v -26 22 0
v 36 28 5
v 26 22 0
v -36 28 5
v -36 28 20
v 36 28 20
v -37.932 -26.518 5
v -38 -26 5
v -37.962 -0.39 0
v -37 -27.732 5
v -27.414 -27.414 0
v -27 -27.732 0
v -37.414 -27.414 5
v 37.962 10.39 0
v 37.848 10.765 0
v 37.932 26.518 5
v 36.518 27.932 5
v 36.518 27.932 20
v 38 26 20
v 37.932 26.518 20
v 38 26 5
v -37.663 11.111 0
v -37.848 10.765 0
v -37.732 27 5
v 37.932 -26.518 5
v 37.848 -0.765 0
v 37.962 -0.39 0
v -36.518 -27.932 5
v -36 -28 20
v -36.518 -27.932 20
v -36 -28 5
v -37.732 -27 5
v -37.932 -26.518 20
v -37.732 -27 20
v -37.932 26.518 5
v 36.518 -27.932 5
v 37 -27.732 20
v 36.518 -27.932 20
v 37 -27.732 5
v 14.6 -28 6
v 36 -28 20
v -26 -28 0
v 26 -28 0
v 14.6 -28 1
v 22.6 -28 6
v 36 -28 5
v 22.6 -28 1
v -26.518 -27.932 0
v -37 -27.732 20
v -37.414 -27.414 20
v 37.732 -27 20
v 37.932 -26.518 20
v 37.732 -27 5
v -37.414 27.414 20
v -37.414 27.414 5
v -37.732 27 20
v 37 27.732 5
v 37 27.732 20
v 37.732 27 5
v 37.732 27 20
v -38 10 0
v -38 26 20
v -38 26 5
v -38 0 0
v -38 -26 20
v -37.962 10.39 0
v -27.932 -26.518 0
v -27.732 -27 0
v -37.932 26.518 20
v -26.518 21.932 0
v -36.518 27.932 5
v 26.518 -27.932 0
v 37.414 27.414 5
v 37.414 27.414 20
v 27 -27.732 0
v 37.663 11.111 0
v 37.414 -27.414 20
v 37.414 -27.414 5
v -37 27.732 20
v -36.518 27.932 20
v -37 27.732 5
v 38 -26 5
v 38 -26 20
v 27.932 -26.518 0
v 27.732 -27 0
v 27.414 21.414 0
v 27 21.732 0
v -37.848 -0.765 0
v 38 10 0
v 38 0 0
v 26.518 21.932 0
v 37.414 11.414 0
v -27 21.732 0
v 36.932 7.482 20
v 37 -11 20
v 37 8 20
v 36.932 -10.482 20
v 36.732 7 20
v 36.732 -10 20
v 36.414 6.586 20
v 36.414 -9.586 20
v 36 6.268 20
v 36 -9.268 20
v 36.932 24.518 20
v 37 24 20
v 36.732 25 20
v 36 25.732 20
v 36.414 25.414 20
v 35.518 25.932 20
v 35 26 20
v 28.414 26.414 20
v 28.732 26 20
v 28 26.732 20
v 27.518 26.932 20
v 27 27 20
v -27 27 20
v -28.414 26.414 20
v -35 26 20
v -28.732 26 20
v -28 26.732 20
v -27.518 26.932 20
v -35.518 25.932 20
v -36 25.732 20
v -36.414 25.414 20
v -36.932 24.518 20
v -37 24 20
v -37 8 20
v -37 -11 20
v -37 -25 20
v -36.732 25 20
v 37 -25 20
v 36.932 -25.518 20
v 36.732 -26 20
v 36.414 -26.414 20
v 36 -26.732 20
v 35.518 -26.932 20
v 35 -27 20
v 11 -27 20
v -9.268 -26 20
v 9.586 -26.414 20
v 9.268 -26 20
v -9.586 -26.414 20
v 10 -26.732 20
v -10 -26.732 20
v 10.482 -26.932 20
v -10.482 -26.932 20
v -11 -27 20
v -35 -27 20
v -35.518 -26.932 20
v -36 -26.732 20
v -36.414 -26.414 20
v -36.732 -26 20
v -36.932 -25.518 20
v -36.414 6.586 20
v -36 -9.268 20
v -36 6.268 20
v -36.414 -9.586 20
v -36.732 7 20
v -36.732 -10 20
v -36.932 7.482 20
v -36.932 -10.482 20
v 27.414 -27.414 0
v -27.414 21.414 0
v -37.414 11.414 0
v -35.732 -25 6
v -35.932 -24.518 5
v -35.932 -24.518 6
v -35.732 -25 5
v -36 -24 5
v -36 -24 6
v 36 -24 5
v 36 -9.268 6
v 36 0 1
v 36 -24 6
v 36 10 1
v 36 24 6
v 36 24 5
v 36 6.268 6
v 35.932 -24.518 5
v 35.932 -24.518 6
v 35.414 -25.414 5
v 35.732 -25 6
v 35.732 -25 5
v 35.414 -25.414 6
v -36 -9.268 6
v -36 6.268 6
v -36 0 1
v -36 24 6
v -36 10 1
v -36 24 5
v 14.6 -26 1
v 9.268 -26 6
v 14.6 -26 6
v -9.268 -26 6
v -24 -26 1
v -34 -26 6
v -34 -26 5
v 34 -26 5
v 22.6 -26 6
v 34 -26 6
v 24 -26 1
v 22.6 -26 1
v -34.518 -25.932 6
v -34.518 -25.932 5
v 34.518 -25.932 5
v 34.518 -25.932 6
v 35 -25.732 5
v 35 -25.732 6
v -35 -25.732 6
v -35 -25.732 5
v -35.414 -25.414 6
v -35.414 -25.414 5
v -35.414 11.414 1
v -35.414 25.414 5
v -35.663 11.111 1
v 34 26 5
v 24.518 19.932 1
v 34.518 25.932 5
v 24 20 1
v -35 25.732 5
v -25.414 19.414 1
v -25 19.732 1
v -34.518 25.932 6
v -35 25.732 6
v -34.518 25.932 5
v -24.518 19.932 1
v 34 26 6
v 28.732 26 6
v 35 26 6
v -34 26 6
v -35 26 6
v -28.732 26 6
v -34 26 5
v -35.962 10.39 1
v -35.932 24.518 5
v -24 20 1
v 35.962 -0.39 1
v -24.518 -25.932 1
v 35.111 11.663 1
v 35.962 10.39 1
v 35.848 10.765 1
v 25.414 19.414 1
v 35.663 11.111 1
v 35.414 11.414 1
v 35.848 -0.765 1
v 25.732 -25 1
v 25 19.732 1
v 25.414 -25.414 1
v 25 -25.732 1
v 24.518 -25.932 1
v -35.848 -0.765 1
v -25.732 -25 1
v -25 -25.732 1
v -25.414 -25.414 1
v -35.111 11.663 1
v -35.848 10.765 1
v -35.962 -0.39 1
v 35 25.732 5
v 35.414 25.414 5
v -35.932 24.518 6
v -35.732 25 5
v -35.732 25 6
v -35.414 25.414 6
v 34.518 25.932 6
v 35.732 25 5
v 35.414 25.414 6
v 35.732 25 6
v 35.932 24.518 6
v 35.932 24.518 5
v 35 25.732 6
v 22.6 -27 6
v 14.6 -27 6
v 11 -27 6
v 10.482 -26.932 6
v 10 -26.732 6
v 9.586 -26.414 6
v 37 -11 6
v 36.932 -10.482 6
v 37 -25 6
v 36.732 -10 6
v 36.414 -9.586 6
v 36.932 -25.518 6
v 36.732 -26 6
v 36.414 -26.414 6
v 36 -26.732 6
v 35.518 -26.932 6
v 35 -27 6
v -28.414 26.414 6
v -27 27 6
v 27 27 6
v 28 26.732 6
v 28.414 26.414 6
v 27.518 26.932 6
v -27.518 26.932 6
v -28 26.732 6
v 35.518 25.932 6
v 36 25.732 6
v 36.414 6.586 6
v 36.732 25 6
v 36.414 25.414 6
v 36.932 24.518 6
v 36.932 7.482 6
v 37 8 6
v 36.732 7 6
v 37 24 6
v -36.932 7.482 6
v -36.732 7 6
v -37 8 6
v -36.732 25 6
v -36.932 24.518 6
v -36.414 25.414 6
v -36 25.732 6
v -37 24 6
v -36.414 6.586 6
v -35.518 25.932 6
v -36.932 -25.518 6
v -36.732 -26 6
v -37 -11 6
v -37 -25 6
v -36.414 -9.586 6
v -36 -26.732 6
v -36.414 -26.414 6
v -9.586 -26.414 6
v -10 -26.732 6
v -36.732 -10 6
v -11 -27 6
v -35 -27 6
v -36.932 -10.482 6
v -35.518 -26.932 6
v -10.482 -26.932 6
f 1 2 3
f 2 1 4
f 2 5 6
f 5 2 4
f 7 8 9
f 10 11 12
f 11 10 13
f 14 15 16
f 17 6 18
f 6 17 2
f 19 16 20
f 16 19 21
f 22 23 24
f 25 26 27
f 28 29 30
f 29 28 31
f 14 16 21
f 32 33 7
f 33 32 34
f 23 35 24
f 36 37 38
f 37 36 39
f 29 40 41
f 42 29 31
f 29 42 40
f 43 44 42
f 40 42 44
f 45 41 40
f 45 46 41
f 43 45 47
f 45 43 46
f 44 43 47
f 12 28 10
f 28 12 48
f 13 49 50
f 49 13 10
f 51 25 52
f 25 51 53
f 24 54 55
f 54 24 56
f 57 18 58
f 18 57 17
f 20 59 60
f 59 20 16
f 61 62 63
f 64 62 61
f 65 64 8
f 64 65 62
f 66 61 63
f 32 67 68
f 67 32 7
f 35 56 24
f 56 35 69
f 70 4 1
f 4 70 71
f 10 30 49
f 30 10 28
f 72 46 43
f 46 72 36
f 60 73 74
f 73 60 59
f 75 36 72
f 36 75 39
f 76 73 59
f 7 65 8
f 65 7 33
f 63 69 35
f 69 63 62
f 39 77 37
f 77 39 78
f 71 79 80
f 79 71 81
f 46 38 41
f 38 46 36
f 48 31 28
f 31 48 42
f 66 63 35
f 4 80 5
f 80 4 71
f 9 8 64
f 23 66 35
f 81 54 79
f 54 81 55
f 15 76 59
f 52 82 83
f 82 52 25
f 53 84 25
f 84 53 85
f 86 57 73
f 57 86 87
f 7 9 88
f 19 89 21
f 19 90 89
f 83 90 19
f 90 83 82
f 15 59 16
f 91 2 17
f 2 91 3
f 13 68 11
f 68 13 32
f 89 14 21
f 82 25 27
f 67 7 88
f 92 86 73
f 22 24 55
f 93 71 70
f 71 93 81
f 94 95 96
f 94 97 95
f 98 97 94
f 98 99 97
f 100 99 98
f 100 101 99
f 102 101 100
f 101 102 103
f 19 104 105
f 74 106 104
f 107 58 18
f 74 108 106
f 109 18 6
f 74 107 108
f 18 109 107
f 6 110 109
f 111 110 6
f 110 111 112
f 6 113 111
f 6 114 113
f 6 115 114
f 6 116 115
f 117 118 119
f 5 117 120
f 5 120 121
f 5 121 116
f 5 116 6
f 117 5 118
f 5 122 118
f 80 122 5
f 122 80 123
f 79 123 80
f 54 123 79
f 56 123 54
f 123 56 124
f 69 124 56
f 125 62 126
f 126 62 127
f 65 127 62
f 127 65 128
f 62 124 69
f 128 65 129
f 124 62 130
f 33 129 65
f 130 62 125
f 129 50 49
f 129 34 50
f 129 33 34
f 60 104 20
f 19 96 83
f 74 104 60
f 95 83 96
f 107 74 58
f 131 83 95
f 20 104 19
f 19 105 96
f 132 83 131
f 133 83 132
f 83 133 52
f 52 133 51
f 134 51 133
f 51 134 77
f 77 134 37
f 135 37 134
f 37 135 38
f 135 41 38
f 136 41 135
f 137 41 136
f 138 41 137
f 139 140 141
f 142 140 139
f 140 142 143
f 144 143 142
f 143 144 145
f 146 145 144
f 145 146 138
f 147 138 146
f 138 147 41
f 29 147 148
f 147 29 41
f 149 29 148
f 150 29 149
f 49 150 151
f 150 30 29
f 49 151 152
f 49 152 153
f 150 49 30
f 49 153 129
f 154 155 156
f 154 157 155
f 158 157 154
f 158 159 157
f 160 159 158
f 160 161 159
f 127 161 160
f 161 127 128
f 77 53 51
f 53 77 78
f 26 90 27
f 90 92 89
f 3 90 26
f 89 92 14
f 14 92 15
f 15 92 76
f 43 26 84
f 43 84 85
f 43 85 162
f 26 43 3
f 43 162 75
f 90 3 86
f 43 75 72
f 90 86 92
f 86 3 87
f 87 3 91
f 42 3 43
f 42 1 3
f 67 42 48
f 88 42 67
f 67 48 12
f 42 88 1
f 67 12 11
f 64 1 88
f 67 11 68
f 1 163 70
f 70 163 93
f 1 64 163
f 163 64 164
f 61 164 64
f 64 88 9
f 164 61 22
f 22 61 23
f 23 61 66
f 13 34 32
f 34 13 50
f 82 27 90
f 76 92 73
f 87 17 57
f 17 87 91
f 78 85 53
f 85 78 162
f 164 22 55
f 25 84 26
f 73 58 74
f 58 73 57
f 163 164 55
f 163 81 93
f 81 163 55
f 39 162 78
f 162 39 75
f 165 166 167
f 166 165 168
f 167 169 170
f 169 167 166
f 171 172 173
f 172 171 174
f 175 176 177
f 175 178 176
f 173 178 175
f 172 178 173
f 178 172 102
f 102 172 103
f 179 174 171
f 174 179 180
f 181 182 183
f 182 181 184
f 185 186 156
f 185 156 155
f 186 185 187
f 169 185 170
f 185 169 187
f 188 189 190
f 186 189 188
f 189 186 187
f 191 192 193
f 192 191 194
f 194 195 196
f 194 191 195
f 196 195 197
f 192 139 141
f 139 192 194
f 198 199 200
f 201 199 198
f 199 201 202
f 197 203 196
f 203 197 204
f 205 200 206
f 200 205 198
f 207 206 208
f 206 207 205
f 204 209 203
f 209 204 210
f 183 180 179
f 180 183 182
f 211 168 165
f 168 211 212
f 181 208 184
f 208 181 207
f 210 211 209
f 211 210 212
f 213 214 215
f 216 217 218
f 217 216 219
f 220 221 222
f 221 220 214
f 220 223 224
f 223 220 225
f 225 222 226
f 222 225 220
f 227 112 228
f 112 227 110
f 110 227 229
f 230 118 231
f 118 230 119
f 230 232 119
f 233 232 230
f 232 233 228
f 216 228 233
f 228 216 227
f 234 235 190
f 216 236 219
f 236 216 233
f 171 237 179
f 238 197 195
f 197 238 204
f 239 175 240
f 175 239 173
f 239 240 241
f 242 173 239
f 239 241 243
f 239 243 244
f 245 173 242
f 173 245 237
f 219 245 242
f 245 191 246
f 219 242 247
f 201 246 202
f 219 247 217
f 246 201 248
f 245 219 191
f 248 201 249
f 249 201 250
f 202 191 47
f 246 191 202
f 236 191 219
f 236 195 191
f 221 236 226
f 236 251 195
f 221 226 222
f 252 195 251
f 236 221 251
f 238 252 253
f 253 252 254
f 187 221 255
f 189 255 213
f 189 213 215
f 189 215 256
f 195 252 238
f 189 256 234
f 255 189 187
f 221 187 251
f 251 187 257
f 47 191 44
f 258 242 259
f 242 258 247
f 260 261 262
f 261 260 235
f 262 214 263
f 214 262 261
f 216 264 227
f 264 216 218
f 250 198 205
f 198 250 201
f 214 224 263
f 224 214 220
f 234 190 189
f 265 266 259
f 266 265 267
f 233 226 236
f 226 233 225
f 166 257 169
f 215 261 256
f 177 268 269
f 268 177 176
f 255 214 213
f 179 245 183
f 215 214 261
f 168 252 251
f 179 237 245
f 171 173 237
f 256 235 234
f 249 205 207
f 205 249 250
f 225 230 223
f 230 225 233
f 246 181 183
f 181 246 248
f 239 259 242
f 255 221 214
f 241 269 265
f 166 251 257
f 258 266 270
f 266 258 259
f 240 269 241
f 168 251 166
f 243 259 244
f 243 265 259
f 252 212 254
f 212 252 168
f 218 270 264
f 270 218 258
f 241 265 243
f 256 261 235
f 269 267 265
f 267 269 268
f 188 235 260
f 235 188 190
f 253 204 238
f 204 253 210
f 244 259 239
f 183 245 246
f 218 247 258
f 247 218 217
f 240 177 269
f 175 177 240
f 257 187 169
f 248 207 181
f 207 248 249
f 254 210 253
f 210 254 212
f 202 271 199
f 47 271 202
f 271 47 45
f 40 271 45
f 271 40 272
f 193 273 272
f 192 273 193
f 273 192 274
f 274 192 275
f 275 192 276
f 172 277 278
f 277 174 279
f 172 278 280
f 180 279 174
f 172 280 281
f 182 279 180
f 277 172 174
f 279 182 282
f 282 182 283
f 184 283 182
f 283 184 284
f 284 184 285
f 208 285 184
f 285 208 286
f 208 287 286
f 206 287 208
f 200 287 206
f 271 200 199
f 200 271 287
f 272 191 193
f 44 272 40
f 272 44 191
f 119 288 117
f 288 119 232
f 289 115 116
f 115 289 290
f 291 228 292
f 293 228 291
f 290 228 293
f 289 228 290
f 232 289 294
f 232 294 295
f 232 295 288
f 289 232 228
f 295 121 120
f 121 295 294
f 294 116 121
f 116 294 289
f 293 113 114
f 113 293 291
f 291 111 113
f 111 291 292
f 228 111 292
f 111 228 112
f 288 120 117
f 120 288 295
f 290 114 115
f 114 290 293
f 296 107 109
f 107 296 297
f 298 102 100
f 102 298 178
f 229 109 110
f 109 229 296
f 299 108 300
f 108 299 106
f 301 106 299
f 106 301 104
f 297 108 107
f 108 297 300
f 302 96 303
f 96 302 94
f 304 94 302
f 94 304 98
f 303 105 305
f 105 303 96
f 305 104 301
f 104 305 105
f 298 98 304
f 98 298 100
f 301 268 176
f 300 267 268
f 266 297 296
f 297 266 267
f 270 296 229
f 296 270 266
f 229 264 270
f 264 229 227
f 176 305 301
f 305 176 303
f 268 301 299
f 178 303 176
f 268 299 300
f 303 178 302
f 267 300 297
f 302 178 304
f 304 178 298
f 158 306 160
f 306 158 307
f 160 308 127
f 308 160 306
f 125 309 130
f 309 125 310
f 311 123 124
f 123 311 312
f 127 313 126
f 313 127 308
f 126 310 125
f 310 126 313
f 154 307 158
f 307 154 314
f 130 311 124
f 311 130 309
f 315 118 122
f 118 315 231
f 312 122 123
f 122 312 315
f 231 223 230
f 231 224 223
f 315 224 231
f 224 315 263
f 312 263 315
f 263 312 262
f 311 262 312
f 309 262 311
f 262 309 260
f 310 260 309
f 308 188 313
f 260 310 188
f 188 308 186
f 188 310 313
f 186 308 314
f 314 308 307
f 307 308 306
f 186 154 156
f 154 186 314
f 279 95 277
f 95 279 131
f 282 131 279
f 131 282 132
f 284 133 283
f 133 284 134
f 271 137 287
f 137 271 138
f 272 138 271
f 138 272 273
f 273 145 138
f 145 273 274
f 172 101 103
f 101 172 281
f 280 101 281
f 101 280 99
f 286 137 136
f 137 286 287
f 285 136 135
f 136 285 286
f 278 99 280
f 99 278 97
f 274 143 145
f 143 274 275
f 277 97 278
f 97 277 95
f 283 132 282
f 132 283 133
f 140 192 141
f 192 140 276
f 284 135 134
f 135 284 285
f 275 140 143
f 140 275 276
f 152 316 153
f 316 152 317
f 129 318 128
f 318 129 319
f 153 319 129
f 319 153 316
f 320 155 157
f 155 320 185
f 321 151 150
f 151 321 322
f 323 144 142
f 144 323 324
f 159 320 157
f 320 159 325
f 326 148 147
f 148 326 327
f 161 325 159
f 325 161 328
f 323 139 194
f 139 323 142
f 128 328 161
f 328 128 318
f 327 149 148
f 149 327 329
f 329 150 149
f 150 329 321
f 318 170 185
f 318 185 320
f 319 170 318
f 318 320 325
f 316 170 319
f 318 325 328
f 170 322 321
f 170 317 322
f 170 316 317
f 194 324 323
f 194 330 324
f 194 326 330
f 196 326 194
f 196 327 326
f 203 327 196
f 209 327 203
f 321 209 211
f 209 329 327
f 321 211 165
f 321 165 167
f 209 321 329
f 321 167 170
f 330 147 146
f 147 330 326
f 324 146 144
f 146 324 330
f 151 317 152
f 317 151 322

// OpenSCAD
// file: config.scad
$fn = 24;

//Parameters for servo_lx16a
//x,y,z => w,l,h


//servo dimensions
servo_l         = 45.20; //
servo_w         = 24.70; //
servo_h         = 35; //

body_h          = 32; //


top_hub_shoulder_d = 10.5;  
bottom_hub_shoulder_d = 10;

hub_offset      = 10.10; //

rad = 2;


w_between_holes = 20.5; //
att_hole_dia = 1.6; //
attach_screw_l = 5;

//horn side dimensions (top side)
l_between_top_holes = 20.7; //
top_hole_l_offset = 6.1; //
top_hub_carve_h = 2.6; // shown on the side view
top_attach_carve_h = 1.1; //shown on the side view
top_horn_h = 3.20; //
top_horn_d = 6.3; //
horn_hole_d = 2.5; //
top_wider_ridge_l = 14.2; //
top_wider_ridge_w = 19.4; //
top_wider_ridge_offset = 9.3625; //
top_narrow_ridge_w = 13.85;

//pivot side dimensions (bottom side)
l_between_bottom_holes = 24.45; //
bottom_hole_l_offset = 2.35; //
bottom_hub_carve_h = 3.4; // shown on the side view
bottom_attach_carve_h = 1.9; // shown on the side view
bottom_horn_h = 4.1; //
bottom_horn_d = 6; //
bottom_wider_ridge_l = 13.25; //
bottom_wider_ridge_w = 18.48; //
bottom_wider_ridge_offset = 5.61; //
bottom_narrow_ridge_w = 13.5; //

hub_carve_l = 15.57;

hub_carve_r = 10.8;

hub_r = 10.1;

connectors_w = 19;
connectors_l = 4.6;
connectors_h = 4;
connectors_depth = 9;


horn_d = 19.56;
horn_screws_distance = 14.00;



 
// main file
include <config.scad>
//use <servo_12g.scad>
//use <servo_5g.scad>
//use <electronics.scad>


chest();


module chest(){
    
    union(){
    
        difference(){
            
            union(){
                
                hull(){
                
                    translate([-76/2, -56/2, 19])
                    roundedRect([76-rad, 56-rad, 1], rad);
                    
                    translate([-76/2, -56/2, 5])
                    roundedRect([76-rad, 56-rad, 1], rad);
                        
                    translate([-56/2, -50/2-3, 0])
                    roundedRect([56-rad, 50-rad, 1], rad);
                    
                    translate([-72/2, 0, 0])
                    cylinder(r=rad, h=20, $fn=32);
                    
                    translate([72/2, 0, 0])
                    cylinder(r=rad, h=20, $fn=32);

                    translate([-72/2, 10, 0])
                    cylinder(r=rad, h=20, $fn=32);
                    
                    translate([72/2, 10, 0])
                    cylinder(r=rad, h=20, $fn=32);
                    
                    //translate([-74/2, -10, 5])
                    //cylinder(r=rad, h=15, $fn=32);
                    
                    //translate([74/2, -10, 5])
                    //cylinder(r=rad, h=15, $fn=32);

                    
                }
            
                
               /**
                //right side tab
                translate([-76/2, 0, 10+20/2]) rotate([0, 0, 0]) difference() {
                    union() {
                        
                        translate([-2/2, -12.5/2-2, 0])
                        cube([2, 12.5, 5.85]);
                        
                        translate([0, -2, 0])
                        rotate([90,0,0])
                        cylinder(r=1, h=12.5, $fn=32, center=true);
        
                        translate([0, -2, 5.85])
                        rotate([90,0,0])
                        cylinder(r=1, h=12.5, $fn=32, center=true);  
          
                        translate([0, -12.5/2-2, 0])
                        cube([1, 12.5, 6.85]);              
                    }
                    
                    //translate([1, -14/2-2, 0])
                    //cube([2, 14, 7.85]);
                    
                    translate([0, -2, 4])
                    rotate([0, 90, 0])
                    cylinder(d=2, h=4, center=true, $fn=64);
                    
                }
                
            
            
            
                //left side tab
                translate([76/2, 0, 10+20/2]) rotate([0, 0, 0]) difference() {
                    union() {
                        
                        translate([-2/2, -12.5/2-2, 0])
                        cube([2, 12.5, 5.85]);
                        
                        translate([0, -2, 0])
                        rotate([90,0,0])
                        cylinder(r=1, h=12.5, $fn=32, center=true);
        
                        translate([0, -2, 5.85])
                        rotate([90,0,0])
                        cylinder(r=1, h=12.5, $fn=32, center=true);
                  
                        translate([-1, -12.5/2-2, 0])
                        cube([1, 12.5, 6.85]);      
                        
                    }
                    
                    //translate([-3, -14/2-2, 0])
                    //cube([2, 14, 7.85]);
                    
                    translate([-0, -2, 4])
                    rotate([0, 90, 0])
                    cylinder(d=2, h=4, center=true, $fn=64);
                    
                }
                
                
                //bottom tab
                translate([0, -56/2+2, 10+20/2]) difference(){
                    union(){
                
                        translate([-11/2, -2/2-2, 0])
                        cube([11, 2, 5.85]);
                        
                        translate([0, -2, 0])
                        rotate([0,90,0])
                        cylinder(r=1, h=11, $fn=32, center=true);
        
                        translate([0, -2, 5.85])
                        rotate([0,90,0])
                        cylinder(r=1, h=11, $fn=32, center=true);
                        
                        translate([-11/2, -2, 0])
                        cube([11, 1, 6.85]);
                        
                        
                    }
                    
                    
                //translate([-12.5/2, -1, 0])
                //cube([12.5, 2, 7.85]);
                
                translate([0, -2, 4])
                rotate([90, 0, 0])
                cylinder(d=2, h=4, center=true, $fn=64);
                
                
            }
                
            
                //top tab
                translate([0, 56/2+2, 10+20/2]) difference(){
                    union(){
                
                        translate([-73/2, -2/2-2, 0])
                        cube([73, 2, 6.85]);
                        
                        translate([0, -2, 0])
                        rotate([0,90,0])
                        cylinder(r=1, h=73, $fn=32, center=true);
        
                        translate([0, -2, 5.85])
                        rotate([0,90,0])
                        cylinder(r=1, h=73, $fn=32, center=true);
                        
                        translate([-73/2, -2, 0])
                        cube([73, 1, 5.85]);
                        
                        
                    }
                    
                    
                translate([-57/2, -3.1, -1])
                cube([57, 2.2, 8.85]);
                
                //translate([0, -2, 4])
                //rotate([90, 0, 0])
                //#cylinder(d=2, h=4, center=true, $fn=64);
                    
                translate([32.5, -2, 4])
                rotate([90, 0, 0])
                cylinder(d=2, h=4, center=true, $fn=64);
                            
                translate([-32.5, -2, 4])
                rotate([90, 0, 0])
                #cylinder(d=2, h=4, center=true, $fn=64);
                
                
            }
            **/
            
            }
            
            //carveout
                
            translate([-72/2, -52/2 ,6])
            //cube([72, 52, 18.1]);
            roundedRect([72-rad, 51-rad, 19.1], rad);
            
            hull(){
                
                translate([-72/2, -52/2, 19])
                roundedRect([72-rad, 52-rad, 1], rad);
                
                translate([-72/2, -52/2, 5])
                roundedRect([72-rad, 52-rad, 1], rad);
                    
                translate([-52/2, -46/2-3, 1])
                roundedRect([52-rad, 46-rad, 1], rad);
                
                translate([-68/2, 0, 1])
                cylinder(r=rad, h=20, $fn=32);
                
                translate([68/2, 0, 1])
                cylinder(r=rad, h=20, $fn=32);

                translate([-68/2, 10, 1])
                cylinder(r=rad, h=20, $fn=32);
                
                translate([68/2, 10, 1])
                cylinder(r=rad, h=20, $fn=32);
                
                //translate([-70/2, -10, 5])
                //cylinder(r=rad, h=15, $fn=32);
                
                //translate([70/2, -10, 5])
                //cylinder(r=rad, h=15, $fn=32);

            
            }
            
            //hole for the microUSB connector
            translate([-8/2+18.6, -52/2-4 ,1])
            cube([8, 5, 5]);
            
            /**
            //carve out on low tab to allow power card to be flush
            intersection(){
                translate([-22/2, -52/2-2 ,1])
                cube([22, 5, 3]);

                translate([-22/2, -52/2+1 ,-1])
                rotate([60, 0, 0])
                cube([22, 5, 3]);
                   
            }
            **/
            
            //wall thinning for weight reduction
            
            translate([-58/2, 56/2-20-1, 6])
            roundedRect([58-rad, 20-rad, 19.1], rad);
            
            translate([76/2-22-1, 56/2-20-2, 6])
            roundedRect([22-rad, 20-rad, 19.1], rad);
    
            translate([-76/2+1, 56/2-20-2, 6])
            roundedRect([22-rad, 20-rad, 19.1], rad);
            
            translate([76/2-28-1, -56/2+1, 6])
            roundedRect([28-rad, 18-rad, 19.1], rad);
            
            translate([-76/2+1, -56/2+1, 6])
            roundedRect([28-rad, 18-rad, 19.1], rad);
       
            
        }
    
        
        /**
        rotate([-90, 0, 0]) translate([0,0.4,-28]) color("yellow") difference(){
            
            translate([-53.4/2, -5.7/2-5.7/2-0.4, 0])
            roundedRect([53.4-rad+1, 5.7-rad+1, 15], rad-1);
            
            translate([-51.4/2, -3.7/2-2.3/2-2.3, 0])
            #roundedRect([51.4-rad+1, 3.7-rad+1, 18], rad-1);
            
            translate([-49/2, -3/2-3/2-3.3-0.3, -1])
            cube([49, 2.5, 17]);
            //roundedRect([50-rad+1, 2.3-rad+1, 15], rad-1);
            
        }
        **/
        
    }
   
}

module roundedRect(size, radius)
{
x = size[0];
y = size[1];
z = size[2];

translate([x/2+radius/2, y/2+radius/2, 0]){
linear_extrude(height=z)
hull()
{
// place 4 circles in the corners, with the given radius
translate([(-x/2)+(radius/2), (-y/2)+(radius/2), 0])
circle(r=radius);

translate([(x/2)-(radius/2), (-y/2)+(radius/2), 0])
circle(r=radius);

translate([(-x/2)+(radius/2), (y/2)-(radius/2), 0])
circle(r=radius);

translate([(x/2)-(radius/2), (y/2)-(radius/2), 0])
circle(r=radius);
}
}
}
